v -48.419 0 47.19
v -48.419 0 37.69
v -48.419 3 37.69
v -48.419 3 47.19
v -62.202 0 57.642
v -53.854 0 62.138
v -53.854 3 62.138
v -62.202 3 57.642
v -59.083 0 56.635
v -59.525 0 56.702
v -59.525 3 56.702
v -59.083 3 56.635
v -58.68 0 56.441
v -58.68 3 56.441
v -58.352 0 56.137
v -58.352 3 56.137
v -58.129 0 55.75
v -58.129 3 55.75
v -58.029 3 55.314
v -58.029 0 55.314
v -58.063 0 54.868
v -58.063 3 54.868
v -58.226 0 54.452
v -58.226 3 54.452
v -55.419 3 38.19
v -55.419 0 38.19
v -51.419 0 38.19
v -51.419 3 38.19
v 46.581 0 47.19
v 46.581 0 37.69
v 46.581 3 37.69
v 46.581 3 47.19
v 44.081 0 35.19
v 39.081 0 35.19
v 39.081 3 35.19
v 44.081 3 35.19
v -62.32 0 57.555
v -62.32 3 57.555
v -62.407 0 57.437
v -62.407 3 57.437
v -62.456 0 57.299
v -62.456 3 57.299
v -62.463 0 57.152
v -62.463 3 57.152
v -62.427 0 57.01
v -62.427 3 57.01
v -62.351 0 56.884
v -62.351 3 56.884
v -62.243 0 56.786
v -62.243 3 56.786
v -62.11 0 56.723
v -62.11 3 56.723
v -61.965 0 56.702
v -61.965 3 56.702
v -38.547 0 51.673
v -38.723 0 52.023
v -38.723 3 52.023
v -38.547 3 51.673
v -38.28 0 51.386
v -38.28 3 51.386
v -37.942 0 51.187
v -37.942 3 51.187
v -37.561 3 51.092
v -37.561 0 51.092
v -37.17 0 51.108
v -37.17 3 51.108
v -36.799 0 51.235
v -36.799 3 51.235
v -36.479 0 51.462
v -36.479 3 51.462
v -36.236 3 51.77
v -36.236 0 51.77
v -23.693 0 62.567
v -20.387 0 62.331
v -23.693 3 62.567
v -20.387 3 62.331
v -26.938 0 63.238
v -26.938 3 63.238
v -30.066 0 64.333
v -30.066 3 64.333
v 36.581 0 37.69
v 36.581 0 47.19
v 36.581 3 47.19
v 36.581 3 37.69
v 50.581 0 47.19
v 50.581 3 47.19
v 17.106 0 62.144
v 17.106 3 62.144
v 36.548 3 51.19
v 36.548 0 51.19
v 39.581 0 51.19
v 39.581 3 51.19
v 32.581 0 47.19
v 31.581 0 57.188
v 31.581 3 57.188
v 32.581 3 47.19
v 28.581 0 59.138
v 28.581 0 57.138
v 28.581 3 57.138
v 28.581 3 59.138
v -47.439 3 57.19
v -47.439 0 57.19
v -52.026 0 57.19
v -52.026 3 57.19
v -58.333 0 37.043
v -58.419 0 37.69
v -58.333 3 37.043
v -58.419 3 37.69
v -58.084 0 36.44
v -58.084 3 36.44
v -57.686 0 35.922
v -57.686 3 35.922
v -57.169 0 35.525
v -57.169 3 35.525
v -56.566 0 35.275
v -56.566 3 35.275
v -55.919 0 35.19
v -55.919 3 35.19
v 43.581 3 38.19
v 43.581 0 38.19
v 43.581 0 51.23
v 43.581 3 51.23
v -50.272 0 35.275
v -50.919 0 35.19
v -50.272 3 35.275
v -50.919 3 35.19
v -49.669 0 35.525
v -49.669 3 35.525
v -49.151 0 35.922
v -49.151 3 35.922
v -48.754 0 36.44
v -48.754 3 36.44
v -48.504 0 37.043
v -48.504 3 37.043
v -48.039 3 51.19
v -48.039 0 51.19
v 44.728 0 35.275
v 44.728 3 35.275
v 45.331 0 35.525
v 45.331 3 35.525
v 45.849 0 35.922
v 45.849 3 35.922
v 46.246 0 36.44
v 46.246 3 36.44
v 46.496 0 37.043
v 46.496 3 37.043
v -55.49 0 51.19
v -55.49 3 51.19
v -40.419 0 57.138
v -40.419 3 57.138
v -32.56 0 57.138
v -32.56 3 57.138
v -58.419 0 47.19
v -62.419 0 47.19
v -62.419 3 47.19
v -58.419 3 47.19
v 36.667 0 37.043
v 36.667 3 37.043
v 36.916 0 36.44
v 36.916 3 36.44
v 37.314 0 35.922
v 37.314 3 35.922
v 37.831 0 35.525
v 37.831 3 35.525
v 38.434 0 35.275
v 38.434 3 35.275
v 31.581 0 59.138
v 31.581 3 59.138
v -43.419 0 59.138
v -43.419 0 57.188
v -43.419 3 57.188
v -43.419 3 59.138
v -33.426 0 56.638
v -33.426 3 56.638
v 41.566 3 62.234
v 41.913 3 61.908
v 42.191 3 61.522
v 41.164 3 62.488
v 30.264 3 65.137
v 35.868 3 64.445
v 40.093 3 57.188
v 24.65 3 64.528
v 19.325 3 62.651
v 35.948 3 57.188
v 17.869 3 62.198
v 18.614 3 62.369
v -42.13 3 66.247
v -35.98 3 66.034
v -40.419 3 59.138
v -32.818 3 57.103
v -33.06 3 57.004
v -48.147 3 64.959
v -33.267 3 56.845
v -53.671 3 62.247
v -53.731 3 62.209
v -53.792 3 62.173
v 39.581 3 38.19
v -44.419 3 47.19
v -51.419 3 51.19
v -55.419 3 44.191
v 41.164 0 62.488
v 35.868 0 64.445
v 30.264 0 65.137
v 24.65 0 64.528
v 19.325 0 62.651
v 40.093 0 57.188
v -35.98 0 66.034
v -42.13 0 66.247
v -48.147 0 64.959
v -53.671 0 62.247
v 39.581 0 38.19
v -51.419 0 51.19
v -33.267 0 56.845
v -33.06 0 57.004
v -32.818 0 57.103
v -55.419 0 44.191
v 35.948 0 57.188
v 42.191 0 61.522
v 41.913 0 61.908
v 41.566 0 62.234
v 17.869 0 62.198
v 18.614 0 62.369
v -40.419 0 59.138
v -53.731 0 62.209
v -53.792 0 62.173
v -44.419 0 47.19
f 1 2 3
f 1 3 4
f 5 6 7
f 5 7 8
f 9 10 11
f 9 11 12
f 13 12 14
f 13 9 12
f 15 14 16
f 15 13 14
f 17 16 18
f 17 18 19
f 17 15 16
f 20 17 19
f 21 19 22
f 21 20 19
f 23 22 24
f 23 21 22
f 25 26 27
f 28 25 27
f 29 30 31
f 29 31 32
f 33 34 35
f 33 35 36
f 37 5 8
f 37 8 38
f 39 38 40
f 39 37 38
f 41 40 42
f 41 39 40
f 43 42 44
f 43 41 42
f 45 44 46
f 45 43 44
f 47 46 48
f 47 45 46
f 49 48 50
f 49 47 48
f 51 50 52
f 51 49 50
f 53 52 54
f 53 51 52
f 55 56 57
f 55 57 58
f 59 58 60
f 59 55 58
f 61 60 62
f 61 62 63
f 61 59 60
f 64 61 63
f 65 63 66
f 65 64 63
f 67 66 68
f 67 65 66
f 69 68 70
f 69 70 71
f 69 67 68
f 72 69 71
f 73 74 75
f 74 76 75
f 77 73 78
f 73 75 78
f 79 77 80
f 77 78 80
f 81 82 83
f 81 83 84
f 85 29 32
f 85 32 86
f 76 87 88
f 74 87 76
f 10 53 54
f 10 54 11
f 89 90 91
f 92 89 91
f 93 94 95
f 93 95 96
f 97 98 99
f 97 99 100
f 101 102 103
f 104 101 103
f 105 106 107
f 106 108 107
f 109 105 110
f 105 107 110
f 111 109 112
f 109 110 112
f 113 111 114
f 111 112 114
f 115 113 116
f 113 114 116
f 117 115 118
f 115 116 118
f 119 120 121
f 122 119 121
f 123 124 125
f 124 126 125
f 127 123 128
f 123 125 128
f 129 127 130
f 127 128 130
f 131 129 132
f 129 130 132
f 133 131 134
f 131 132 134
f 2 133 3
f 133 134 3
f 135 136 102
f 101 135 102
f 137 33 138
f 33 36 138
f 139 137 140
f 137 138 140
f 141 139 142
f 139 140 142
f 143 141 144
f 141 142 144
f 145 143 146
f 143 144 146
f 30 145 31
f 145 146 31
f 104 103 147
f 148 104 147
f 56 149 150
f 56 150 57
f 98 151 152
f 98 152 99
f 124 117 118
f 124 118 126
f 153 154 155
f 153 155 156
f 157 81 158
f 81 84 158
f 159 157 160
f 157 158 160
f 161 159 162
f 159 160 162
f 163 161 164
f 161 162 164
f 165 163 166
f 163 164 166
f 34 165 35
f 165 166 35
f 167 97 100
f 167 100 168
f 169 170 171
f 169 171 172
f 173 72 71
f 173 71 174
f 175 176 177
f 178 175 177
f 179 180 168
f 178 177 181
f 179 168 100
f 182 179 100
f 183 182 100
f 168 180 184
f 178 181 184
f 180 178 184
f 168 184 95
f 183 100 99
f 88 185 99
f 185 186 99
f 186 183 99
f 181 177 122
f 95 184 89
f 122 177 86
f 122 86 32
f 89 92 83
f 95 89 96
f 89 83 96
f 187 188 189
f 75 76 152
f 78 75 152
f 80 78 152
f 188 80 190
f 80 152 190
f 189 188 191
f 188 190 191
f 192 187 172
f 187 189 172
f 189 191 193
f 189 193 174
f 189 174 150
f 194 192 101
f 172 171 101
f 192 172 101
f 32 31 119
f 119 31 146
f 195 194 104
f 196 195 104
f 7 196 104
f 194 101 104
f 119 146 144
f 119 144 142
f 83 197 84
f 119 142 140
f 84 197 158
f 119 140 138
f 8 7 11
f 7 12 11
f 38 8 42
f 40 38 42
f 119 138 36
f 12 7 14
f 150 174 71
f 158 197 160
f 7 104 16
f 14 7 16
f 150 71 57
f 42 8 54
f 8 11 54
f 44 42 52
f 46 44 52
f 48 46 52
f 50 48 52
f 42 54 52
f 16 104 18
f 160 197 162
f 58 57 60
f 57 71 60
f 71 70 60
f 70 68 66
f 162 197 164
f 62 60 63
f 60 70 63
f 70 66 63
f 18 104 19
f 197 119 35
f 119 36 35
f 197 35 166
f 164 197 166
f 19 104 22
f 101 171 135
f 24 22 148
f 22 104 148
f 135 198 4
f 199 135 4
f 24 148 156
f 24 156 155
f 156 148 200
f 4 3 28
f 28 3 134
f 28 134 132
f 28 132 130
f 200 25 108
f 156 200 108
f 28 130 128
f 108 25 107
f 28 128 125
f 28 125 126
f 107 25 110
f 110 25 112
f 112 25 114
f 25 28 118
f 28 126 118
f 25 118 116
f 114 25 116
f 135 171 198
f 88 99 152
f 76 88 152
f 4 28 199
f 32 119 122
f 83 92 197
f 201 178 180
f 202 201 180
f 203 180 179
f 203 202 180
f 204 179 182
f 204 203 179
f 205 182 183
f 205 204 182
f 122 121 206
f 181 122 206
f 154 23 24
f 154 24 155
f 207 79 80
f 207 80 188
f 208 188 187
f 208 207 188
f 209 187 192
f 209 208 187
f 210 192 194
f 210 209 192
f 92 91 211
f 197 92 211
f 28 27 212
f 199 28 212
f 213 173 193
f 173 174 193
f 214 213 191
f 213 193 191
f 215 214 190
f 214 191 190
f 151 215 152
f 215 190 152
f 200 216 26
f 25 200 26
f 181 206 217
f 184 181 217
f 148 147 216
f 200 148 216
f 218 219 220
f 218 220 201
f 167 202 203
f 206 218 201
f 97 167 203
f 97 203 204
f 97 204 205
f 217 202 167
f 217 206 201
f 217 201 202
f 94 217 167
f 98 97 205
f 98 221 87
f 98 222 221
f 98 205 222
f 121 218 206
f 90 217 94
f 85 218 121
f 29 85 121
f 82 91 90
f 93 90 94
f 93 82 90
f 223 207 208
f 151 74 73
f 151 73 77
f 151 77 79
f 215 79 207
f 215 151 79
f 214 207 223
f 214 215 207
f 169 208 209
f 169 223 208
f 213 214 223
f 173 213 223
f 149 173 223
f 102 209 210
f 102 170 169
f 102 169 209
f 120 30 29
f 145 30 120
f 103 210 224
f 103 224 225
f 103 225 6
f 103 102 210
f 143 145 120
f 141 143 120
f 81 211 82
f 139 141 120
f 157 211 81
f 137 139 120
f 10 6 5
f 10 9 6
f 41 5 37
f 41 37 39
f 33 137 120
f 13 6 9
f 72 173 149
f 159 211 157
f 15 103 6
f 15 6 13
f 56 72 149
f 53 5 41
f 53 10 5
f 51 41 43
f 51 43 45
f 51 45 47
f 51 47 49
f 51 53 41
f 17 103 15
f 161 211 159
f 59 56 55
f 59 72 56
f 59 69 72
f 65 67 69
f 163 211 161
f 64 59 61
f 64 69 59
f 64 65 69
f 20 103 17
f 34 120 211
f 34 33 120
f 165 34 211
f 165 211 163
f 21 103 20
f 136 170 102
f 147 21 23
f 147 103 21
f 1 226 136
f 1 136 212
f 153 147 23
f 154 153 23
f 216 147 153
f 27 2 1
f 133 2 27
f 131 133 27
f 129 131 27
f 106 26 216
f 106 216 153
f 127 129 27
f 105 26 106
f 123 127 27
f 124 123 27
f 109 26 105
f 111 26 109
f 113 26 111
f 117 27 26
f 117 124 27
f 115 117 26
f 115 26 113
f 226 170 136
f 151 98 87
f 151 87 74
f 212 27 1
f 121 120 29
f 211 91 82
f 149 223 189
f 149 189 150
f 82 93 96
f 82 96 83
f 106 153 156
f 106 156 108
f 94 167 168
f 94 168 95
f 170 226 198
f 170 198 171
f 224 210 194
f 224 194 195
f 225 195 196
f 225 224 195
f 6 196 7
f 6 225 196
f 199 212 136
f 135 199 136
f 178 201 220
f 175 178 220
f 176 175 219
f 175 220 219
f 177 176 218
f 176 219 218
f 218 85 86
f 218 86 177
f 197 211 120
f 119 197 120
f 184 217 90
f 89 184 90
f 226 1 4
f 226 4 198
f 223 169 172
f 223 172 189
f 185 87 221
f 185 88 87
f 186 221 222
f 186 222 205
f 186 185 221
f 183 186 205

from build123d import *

# Parameters (mm, degrees)
BOSS_EXTRUDE1_DEPTH = 3
FILLET2_R           = 2.5
FILLET3_R           = 1
FILLET5_R           = 2.5
FILLET6_R           = 5
FILLET7_R           = 25


with BuildPart() as part:
    # Sketch1 → Boss-Extrude1 (new body)
    with BuildSketch(Plane(origin=(0, 0, 0), x_dir=(1, 0, 0), z_dir=(0, 1, 0))):
        with BuildLine():
            Line((-62.418566214, -47.190177149), (-58.418566214, -47.190177149))
            Line((-58.418566214, -47.190177149), (-58.418566214, -35.190177149))
            Line((-58.418566214, -35.190177149), (-48.418566214, -35.190177149))
            Line((-48.418566214, -35.190177149), (-48.418566214, -47.190177149))
            Line((-48.418566214, -47.190177149), (-44.418566214, -47.190177149))
            Line((-44.418566214, -47.190177149), (-43.418817081, -57.187668474))
            Line((-43.418817081, -57.187668474), (-43.418817081, -59.137504987))
            Line((-43.418817081, -59.137504987), (-40.418817081, -59.137504987))
            Line((-40.418817081, -59.137504987), (-40.418817081, -57.137504987))
            Line((-40.418817081, -57.137504987), (-38.722684913, -52.023499684))
            ThreePointArc((-38.722684913, -52.023499684), (-37.561438496, -51.091888176), (-36.235977812, -51.769787298))
            Line((-36.235977812, -51.769787298), (-33.13692456, -57.137504987))
            Line((-33.13692456, -57.137504987), (28.581433786, -57.137504987))
            Line((28.581433786, -57.137504987), (28.581433786, -59.137504987))
            Line((28.581433786, -59.137504987), (31.581433786, -59.137504987))
            Line((31.581433786, -59.137504987), (31.581433786, -57.187643384))
            Line((31.581433786, -57.187643384), (32.581433786, -47.190177149))
            Line((32.581433786, -47.190177149), (36.581433786, -47.190177149))
            Line((36.581433786, -47.190177149), (36.581433786, -35.190177149))
            Line((36.581433786, -35.190177149), (46.581433786, -35.190177149))
            Line((46.581433786, -35.190177149), (46.581433786, -47.190177149))
            Line((46.581433786, -47.190177149), (50.581433786, -47.190177149))
            Line((50.581433786, -47.190177149), (41.830568429, -62.137504987))
            ThreePointArc((41.830568429, -62.137504987), (30.081433786, -65.137504987), (18.332299143, -62.137504987))
            Line((18.332299143, -62.137504987), (-26.340663857, -62.360316421))
            ThreePointArc((-26.340663857, -62.360316421), (-40.074739293, -66.344446247), (-53.758312176, -62.190177149))
            Line((-53.758312176, -62.190177149), (-62.202371167, -57.642224353))
            ThreePointArc((-62.202371167, -57.642224353), (-62.450096964, -57.079754395), (-61.965274707, -56.702013871))
            Line((-61.965274707, -56.702013871), (-59.524980934, -56.702013871))
            ThreePointArc((-59.524980934, -56.702013871), (-58.225942828, -55.952013871), (-58.225942828, -54.452013871))
            Line((-58.225942828, -54.452013871), (-62.418566214, -47.190177149))
        make_face()
        Polygon((36.547763078, -51.190177149), (39.581433786, -51.190177149), (39.581433786, -44.190177149), (39.581433786, -38.190177149), (43.581433786, -38.190177149), (43.581433786, -44.229690019), (43.581433786, -51.229690019), (40.093369012, -57.187643384), (35.947864455, -57.187643384), align=None, mode=Mode.SUBTRACT)
        Polygon((-55.418566214, -38.190177149), (-51.418566214, -38.190177149), (-51.418566214, -44.190177149), (-51.418566214, -51.190177149), (-48.038516462, -51.190177149), (-47.438516462, -57.190177149), (-52.026261368, -57.190177149), (-55.490362984, -51.190177149), (-55.418566214, -44.190545357), align=None, mode=Mode.SUBTRACT)
    extrude(amount=BOSS_EXTRUDE1_DEPTH)

    # Fillet2
    fillet2_edges = [part.edges().sort_by_distance(p)[0] for p in [
        (-58.418566214, 1.5, 35.190177149),
        (-48.418566214, 1.5, 35.190177149),
        (36.581433786, 1.5, 35.190177149),
        (46.581433786, 1.5, 35.190177149),
    ]]
    fillet(fillet2_edges, radius=FILLET2_R)

    # Fillet3
    fillet3_edges = [part.edges().sort_by_distance(p)[0] for p in [
        (-33.13692456, 1.5, 57.137504987),
    ]]
    fillet(fillet3_edges, radius=FILLET3_R)

    # Fillet5
    # the kernel refuses this fillet: 2.5 mm, written as the material it adds along each edge
    with BuildSketch(Plane(origin=(-53.758312176, 0, 62.190177149), x_dir=(0.835787745770118, 0, 0.5490526787299234), z_dir=(0, 1, 0))) as fillet5_piece_1:
        with BuildLine():
            CenterArc((0.109109334, -2.499994653), FILLET5_R, 90.11850268, 4.876730224)
            Line((-0.10857281, -0.009489788), (0, 0))
            ThreePointArc((0, 0), (0.051969341, -5.3743e-05), (0.103938683, 0))
        make_face()
    extrude(amount=3)
    # the kernel refuses this fillet: 2.5 mm, written as the material it takes off along each edge
    with BuildSketch(Plane(origin=(41.830568429, -1.88265381, 62.137504987), x_dir=(0.5052312330715905, 0, -0.8629840097759403), z_dir=(0, 1, 0))) as fillet5_2_piece_1:
        with BuildLine():
            CenterArc((0.713618061, 2.5), FILLET5_R, 237.2334899, 32.7665101)
            ThreePointArc((-0.639423937, 0.397792267), (-0.321239998, 0.19643993), (0, 0))
            Line((0, 0), (0.713618061, 0))
        make_face()
    extrude(amount=6.76530762, mode=Mode.SUBTRACT)

    # Fillet6
    fillet6_edges = [part.edges().sort_by_distance(p)[0] for p in [
        (18.332299143, 1.5, 62.137504987),
    ]]
    fillet(fillet6_edges, radius=FILLET6_R)

    # Fillet7
    fillet7_edges = [part.edges().sort_by_distance(p)[0] for p in [
        (-26.340663857, 1.5, 62.360316421),
    ]]
    fillet(fillet7_edges, radius=FILLET7_R)


solid = part.part
